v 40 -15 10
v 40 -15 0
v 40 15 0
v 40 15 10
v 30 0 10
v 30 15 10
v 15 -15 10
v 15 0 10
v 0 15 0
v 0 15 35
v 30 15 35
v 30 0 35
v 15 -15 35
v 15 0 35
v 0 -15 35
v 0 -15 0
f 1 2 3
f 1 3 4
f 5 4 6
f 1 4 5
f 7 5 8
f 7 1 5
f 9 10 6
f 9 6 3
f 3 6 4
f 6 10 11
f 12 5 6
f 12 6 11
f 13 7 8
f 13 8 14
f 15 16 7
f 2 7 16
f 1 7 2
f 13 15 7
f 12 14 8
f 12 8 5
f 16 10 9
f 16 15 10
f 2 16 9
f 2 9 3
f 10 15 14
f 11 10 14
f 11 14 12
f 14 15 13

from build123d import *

# Parameters (mm, degrees)
F1_DEPTH = 15
F2_W     = 15
F2_H     = 25
F3_DEPTH = 15


with BuildPart() as f1:
    # F0 (on Front) → F1 (new body, symmetric)
    with BuildSketch(Plane.XZ):
        Polygon((0, 35), (0, 0), (40, 0), (40, 10), (15, 10), (15, 35), align=None)
    extrude(amount=F1_DEPTH, both=True)

    # F2 (on Front) → F3 (join)
    with BuildSketch(Plane.XZ):
        with Locations((22.5, 22.5)):
            Rectangle(F2_W, F2_H)
    extrude(amount=-F3_DEPTH)


solid = f1.part
